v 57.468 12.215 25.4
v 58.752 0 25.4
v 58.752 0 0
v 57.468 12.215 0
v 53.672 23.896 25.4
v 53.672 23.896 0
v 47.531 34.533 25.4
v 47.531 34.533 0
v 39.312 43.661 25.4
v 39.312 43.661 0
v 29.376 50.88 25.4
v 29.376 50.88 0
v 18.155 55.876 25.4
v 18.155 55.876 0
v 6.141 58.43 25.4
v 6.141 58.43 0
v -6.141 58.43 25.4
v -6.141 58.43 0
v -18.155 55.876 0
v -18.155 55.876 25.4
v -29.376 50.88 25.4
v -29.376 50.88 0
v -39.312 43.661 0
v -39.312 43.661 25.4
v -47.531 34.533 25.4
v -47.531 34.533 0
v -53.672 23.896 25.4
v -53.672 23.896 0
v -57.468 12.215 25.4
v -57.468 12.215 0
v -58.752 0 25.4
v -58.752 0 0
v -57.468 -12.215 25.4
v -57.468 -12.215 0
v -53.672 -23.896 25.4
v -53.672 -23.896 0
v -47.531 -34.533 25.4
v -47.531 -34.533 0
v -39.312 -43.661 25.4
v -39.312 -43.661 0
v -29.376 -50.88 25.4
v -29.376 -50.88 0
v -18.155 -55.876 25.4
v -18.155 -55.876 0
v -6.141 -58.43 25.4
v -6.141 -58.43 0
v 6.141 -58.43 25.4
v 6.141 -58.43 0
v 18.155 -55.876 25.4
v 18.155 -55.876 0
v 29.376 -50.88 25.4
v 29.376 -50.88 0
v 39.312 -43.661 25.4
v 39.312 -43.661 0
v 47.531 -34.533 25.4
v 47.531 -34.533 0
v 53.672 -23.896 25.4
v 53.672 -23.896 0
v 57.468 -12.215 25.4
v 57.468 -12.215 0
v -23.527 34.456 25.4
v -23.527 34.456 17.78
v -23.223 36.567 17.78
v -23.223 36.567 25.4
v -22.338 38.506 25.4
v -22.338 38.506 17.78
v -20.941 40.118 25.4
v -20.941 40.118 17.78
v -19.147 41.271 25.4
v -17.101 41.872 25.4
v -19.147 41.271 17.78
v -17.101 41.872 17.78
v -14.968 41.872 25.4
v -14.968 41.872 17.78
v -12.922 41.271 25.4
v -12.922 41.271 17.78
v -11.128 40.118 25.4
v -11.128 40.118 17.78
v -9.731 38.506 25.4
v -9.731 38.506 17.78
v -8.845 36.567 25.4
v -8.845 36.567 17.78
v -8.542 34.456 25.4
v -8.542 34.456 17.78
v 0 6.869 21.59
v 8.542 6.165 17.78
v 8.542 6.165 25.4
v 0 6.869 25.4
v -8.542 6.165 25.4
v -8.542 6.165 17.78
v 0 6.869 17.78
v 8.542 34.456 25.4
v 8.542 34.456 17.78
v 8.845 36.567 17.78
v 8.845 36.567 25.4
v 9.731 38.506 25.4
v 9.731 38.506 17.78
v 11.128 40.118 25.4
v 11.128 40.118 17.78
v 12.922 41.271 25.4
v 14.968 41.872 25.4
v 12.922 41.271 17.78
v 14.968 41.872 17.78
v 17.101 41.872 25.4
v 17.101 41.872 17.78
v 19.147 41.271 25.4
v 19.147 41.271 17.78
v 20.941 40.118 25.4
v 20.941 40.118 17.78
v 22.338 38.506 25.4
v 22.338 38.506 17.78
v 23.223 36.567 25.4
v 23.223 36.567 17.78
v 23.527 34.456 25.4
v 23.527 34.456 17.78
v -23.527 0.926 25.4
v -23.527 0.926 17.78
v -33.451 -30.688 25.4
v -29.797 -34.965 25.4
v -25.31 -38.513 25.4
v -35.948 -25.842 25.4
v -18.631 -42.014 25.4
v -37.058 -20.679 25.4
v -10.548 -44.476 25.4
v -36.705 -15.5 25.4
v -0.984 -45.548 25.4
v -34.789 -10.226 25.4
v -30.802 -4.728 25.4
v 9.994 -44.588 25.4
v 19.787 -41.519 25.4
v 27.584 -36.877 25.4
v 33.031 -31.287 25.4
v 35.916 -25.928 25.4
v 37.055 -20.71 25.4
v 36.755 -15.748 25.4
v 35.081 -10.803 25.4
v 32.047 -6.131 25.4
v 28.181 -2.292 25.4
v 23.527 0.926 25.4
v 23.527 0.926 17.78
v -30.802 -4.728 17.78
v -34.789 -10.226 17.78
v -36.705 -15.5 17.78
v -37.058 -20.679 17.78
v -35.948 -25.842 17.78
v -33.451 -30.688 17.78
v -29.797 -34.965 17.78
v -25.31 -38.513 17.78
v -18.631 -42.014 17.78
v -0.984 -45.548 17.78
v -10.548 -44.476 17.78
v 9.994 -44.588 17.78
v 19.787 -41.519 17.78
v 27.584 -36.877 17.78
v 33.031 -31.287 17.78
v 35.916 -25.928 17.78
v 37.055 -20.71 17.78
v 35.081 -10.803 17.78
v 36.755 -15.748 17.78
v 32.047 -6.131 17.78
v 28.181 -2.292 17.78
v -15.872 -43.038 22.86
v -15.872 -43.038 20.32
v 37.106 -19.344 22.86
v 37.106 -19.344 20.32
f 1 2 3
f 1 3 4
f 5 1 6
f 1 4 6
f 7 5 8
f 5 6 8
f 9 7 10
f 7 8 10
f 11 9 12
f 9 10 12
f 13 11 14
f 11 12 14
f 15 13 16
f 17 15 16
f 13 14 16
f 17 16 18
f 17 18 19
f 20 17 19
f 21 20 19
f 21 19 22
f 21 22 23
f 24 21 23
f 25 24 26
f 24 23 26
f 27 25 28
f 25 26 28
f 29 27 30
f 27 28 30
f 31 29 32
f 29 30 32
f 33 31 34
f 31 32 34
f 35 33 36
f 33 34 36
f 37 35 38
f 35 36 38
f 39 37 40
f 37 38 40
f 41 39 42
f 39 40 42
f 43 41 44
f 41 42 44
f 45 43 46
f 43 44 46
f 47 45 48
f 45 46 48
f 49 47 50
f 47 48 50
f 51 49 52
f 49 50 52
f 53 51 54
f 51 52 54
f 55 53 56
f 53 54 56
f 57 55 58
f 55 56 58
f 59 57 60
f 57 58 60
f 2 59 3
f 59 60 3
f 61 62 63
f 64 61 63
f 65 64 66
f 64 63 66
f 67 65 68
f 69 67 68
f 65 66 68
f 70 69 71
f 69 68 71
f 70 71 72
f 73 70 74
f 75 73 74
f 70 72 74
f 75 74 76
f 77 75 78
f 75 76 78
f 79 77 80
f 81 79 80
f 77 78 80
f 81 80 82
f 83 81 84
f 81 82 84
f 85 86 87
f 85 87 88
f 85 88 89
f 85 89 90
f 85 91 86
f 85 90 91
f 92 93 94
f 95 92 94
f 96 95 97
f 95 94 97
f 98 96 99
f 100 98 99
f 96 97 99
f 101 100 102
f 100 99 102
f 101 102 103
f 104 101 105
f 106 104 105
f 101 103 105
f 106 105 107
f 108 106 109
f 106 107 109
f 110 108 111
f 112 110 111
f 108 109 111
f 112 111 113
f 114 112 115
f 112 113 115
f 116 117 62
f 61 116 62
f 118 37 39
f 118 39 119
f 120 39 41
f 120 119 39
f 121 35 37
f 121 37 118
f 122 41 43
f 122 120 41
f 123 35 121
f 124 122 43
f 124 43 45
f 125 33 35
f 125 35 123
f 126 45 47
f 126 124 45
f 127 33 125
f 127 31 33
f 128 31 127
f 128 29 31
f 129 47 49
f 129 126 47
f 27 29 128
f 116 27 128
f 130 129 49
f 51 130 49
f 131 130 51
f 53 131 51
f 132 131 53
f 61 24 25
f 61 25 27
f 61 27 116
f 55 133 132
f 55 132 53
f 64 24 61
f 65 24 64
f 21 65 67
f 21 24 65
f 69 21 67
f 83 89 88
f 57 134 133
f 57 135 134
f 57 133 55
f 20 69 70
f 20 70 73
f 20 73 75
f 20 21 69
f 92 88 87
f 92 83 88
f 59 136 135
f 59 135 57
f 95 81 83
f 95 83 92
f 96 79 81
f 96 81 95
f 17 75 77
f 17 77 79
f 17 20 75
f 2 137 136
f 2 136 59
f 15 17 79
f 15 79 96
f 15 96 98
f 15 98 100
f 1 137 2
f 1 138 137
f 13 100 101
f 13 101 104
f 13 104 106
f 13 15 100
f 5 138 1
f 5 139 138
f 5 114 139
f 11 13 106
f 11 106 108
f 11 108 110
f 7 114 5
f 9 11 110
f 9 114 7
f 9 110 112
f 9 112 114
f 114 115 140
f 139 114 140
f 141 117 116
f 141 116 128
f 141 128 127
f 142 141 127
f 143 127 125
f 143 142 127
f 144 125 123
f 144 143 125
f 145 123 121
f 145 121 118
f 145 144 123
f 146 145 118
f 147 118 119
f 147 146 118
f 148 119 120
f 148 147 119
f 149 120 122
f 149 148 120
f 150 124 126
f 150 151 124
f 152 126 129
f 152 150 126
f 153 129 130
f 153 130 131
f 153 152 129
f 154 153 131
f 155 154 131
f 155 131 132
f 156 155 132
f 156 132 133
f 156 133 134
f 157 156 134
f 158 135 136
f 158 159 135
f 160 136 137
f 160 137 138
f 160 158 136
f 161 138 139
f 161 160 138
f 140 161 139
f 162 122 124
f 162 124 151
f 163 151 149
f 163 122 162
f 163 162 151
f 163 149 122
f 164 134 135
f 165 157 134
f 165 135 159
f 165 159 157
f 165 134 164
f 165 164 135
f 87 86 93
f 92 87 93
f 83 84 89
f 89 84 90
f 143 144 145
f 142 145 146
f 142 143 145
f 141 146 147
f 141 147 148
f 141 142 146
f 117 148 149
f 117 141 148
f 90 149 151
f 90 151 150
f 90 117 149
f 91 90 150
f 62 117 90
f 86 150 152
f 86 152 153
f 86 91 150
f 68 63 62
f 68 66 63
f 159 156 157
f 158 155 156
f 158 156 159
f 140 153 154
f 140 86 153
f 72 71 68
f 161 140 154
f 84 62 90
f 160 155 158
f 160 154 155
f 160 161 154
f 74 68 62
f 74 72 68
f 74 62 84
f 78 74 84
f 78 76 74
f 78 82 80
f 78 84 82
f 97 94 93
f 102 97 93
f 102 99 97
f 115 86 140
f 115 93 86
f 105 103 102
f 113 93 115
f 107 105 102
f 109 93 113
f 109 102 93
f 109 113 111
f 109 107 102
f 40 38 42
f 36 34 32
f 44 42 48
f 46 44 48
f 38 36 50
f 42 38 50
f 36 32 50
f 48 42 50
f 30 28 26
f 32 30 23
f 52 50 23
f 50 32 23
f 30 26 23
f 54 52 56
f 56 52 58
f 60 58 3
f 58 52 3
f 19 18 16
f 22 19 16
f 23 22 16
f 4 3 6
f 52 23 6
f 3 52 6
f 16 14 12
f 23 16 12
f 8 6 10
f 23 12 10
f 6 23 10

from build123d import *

# Parameters (mm, degrees)
F0_R     = 58.751581
F1_DEPTH = 17.78
F2_R     = 58.751581
F3_DEPTH = 7.62


with BuildPart() as f1:
    # F0 (on Top) → F1 (new body)
    with BuildSketch(Plane.XY):
        Circle(F0_R)
    extrude(amount=F1_DEPTH)

    # F2 (on face) → F3 (join)
    with BuildSketch(Plane.XY.offset(17.78)):
        Circle(F2_R)
        with BuildLine():
            add(Edge.make_bspline(
                [(37.105776, -19.34425), (37.105776, -6.939334), (23.526968, 0.926019)],
                knots=[0, 0, 0, 0.884015, 0.884015, 0.884015], degree=2, weights=[1, 0.903895, 1]))
            add(Edge.make_bspline(
                [(-23.526968, 0.926019), (-68.850136, -25.326856), (-15.87218, -43.038036), (37.105776, -60.749215), (37.105776, -19.34425)],
                knots=[2.257577, 2.257577, 2.257577, 4.270381, 4.270381, 6.283185, 6.283185, 6.283185], degree=2, weights=[1, 0.534904, 1, 0.534904, 1]))
            Line((-23.526968, 0.926019), (-23.526968, 34.455653))
            ThreePointArc((-23.526968, 34.455653), (-16.034477, 41.948144), (-8.541986, 34.455653))
            Line((-8.541986, 34.455653), (-8.541986, 6.16471))
            add(Edge.make_bspline(
                [(8.541986, 6.16471), (0, 7.592207), (-8.541986, 6.16471)],
                knots=[1.338507, 1.338507, 1.338507, 1.803086, 1.803086, 1.803086], degree=2, weights=[1, 0.973142, 1]))
            Line((8.541986, 6.16471), (8.541986, 34.455653))
            ThreePointArc((8.541986, 34.455653), (16.034477, 41.948144), (23.526968, 34.455653))
            Line((23.526968, 34.455653), (23.526968, 0.926019))
        make_face(mode=Mode.SUBTRACT)
    extrude(amount=F3_DEPTH)


solid = f1.part
